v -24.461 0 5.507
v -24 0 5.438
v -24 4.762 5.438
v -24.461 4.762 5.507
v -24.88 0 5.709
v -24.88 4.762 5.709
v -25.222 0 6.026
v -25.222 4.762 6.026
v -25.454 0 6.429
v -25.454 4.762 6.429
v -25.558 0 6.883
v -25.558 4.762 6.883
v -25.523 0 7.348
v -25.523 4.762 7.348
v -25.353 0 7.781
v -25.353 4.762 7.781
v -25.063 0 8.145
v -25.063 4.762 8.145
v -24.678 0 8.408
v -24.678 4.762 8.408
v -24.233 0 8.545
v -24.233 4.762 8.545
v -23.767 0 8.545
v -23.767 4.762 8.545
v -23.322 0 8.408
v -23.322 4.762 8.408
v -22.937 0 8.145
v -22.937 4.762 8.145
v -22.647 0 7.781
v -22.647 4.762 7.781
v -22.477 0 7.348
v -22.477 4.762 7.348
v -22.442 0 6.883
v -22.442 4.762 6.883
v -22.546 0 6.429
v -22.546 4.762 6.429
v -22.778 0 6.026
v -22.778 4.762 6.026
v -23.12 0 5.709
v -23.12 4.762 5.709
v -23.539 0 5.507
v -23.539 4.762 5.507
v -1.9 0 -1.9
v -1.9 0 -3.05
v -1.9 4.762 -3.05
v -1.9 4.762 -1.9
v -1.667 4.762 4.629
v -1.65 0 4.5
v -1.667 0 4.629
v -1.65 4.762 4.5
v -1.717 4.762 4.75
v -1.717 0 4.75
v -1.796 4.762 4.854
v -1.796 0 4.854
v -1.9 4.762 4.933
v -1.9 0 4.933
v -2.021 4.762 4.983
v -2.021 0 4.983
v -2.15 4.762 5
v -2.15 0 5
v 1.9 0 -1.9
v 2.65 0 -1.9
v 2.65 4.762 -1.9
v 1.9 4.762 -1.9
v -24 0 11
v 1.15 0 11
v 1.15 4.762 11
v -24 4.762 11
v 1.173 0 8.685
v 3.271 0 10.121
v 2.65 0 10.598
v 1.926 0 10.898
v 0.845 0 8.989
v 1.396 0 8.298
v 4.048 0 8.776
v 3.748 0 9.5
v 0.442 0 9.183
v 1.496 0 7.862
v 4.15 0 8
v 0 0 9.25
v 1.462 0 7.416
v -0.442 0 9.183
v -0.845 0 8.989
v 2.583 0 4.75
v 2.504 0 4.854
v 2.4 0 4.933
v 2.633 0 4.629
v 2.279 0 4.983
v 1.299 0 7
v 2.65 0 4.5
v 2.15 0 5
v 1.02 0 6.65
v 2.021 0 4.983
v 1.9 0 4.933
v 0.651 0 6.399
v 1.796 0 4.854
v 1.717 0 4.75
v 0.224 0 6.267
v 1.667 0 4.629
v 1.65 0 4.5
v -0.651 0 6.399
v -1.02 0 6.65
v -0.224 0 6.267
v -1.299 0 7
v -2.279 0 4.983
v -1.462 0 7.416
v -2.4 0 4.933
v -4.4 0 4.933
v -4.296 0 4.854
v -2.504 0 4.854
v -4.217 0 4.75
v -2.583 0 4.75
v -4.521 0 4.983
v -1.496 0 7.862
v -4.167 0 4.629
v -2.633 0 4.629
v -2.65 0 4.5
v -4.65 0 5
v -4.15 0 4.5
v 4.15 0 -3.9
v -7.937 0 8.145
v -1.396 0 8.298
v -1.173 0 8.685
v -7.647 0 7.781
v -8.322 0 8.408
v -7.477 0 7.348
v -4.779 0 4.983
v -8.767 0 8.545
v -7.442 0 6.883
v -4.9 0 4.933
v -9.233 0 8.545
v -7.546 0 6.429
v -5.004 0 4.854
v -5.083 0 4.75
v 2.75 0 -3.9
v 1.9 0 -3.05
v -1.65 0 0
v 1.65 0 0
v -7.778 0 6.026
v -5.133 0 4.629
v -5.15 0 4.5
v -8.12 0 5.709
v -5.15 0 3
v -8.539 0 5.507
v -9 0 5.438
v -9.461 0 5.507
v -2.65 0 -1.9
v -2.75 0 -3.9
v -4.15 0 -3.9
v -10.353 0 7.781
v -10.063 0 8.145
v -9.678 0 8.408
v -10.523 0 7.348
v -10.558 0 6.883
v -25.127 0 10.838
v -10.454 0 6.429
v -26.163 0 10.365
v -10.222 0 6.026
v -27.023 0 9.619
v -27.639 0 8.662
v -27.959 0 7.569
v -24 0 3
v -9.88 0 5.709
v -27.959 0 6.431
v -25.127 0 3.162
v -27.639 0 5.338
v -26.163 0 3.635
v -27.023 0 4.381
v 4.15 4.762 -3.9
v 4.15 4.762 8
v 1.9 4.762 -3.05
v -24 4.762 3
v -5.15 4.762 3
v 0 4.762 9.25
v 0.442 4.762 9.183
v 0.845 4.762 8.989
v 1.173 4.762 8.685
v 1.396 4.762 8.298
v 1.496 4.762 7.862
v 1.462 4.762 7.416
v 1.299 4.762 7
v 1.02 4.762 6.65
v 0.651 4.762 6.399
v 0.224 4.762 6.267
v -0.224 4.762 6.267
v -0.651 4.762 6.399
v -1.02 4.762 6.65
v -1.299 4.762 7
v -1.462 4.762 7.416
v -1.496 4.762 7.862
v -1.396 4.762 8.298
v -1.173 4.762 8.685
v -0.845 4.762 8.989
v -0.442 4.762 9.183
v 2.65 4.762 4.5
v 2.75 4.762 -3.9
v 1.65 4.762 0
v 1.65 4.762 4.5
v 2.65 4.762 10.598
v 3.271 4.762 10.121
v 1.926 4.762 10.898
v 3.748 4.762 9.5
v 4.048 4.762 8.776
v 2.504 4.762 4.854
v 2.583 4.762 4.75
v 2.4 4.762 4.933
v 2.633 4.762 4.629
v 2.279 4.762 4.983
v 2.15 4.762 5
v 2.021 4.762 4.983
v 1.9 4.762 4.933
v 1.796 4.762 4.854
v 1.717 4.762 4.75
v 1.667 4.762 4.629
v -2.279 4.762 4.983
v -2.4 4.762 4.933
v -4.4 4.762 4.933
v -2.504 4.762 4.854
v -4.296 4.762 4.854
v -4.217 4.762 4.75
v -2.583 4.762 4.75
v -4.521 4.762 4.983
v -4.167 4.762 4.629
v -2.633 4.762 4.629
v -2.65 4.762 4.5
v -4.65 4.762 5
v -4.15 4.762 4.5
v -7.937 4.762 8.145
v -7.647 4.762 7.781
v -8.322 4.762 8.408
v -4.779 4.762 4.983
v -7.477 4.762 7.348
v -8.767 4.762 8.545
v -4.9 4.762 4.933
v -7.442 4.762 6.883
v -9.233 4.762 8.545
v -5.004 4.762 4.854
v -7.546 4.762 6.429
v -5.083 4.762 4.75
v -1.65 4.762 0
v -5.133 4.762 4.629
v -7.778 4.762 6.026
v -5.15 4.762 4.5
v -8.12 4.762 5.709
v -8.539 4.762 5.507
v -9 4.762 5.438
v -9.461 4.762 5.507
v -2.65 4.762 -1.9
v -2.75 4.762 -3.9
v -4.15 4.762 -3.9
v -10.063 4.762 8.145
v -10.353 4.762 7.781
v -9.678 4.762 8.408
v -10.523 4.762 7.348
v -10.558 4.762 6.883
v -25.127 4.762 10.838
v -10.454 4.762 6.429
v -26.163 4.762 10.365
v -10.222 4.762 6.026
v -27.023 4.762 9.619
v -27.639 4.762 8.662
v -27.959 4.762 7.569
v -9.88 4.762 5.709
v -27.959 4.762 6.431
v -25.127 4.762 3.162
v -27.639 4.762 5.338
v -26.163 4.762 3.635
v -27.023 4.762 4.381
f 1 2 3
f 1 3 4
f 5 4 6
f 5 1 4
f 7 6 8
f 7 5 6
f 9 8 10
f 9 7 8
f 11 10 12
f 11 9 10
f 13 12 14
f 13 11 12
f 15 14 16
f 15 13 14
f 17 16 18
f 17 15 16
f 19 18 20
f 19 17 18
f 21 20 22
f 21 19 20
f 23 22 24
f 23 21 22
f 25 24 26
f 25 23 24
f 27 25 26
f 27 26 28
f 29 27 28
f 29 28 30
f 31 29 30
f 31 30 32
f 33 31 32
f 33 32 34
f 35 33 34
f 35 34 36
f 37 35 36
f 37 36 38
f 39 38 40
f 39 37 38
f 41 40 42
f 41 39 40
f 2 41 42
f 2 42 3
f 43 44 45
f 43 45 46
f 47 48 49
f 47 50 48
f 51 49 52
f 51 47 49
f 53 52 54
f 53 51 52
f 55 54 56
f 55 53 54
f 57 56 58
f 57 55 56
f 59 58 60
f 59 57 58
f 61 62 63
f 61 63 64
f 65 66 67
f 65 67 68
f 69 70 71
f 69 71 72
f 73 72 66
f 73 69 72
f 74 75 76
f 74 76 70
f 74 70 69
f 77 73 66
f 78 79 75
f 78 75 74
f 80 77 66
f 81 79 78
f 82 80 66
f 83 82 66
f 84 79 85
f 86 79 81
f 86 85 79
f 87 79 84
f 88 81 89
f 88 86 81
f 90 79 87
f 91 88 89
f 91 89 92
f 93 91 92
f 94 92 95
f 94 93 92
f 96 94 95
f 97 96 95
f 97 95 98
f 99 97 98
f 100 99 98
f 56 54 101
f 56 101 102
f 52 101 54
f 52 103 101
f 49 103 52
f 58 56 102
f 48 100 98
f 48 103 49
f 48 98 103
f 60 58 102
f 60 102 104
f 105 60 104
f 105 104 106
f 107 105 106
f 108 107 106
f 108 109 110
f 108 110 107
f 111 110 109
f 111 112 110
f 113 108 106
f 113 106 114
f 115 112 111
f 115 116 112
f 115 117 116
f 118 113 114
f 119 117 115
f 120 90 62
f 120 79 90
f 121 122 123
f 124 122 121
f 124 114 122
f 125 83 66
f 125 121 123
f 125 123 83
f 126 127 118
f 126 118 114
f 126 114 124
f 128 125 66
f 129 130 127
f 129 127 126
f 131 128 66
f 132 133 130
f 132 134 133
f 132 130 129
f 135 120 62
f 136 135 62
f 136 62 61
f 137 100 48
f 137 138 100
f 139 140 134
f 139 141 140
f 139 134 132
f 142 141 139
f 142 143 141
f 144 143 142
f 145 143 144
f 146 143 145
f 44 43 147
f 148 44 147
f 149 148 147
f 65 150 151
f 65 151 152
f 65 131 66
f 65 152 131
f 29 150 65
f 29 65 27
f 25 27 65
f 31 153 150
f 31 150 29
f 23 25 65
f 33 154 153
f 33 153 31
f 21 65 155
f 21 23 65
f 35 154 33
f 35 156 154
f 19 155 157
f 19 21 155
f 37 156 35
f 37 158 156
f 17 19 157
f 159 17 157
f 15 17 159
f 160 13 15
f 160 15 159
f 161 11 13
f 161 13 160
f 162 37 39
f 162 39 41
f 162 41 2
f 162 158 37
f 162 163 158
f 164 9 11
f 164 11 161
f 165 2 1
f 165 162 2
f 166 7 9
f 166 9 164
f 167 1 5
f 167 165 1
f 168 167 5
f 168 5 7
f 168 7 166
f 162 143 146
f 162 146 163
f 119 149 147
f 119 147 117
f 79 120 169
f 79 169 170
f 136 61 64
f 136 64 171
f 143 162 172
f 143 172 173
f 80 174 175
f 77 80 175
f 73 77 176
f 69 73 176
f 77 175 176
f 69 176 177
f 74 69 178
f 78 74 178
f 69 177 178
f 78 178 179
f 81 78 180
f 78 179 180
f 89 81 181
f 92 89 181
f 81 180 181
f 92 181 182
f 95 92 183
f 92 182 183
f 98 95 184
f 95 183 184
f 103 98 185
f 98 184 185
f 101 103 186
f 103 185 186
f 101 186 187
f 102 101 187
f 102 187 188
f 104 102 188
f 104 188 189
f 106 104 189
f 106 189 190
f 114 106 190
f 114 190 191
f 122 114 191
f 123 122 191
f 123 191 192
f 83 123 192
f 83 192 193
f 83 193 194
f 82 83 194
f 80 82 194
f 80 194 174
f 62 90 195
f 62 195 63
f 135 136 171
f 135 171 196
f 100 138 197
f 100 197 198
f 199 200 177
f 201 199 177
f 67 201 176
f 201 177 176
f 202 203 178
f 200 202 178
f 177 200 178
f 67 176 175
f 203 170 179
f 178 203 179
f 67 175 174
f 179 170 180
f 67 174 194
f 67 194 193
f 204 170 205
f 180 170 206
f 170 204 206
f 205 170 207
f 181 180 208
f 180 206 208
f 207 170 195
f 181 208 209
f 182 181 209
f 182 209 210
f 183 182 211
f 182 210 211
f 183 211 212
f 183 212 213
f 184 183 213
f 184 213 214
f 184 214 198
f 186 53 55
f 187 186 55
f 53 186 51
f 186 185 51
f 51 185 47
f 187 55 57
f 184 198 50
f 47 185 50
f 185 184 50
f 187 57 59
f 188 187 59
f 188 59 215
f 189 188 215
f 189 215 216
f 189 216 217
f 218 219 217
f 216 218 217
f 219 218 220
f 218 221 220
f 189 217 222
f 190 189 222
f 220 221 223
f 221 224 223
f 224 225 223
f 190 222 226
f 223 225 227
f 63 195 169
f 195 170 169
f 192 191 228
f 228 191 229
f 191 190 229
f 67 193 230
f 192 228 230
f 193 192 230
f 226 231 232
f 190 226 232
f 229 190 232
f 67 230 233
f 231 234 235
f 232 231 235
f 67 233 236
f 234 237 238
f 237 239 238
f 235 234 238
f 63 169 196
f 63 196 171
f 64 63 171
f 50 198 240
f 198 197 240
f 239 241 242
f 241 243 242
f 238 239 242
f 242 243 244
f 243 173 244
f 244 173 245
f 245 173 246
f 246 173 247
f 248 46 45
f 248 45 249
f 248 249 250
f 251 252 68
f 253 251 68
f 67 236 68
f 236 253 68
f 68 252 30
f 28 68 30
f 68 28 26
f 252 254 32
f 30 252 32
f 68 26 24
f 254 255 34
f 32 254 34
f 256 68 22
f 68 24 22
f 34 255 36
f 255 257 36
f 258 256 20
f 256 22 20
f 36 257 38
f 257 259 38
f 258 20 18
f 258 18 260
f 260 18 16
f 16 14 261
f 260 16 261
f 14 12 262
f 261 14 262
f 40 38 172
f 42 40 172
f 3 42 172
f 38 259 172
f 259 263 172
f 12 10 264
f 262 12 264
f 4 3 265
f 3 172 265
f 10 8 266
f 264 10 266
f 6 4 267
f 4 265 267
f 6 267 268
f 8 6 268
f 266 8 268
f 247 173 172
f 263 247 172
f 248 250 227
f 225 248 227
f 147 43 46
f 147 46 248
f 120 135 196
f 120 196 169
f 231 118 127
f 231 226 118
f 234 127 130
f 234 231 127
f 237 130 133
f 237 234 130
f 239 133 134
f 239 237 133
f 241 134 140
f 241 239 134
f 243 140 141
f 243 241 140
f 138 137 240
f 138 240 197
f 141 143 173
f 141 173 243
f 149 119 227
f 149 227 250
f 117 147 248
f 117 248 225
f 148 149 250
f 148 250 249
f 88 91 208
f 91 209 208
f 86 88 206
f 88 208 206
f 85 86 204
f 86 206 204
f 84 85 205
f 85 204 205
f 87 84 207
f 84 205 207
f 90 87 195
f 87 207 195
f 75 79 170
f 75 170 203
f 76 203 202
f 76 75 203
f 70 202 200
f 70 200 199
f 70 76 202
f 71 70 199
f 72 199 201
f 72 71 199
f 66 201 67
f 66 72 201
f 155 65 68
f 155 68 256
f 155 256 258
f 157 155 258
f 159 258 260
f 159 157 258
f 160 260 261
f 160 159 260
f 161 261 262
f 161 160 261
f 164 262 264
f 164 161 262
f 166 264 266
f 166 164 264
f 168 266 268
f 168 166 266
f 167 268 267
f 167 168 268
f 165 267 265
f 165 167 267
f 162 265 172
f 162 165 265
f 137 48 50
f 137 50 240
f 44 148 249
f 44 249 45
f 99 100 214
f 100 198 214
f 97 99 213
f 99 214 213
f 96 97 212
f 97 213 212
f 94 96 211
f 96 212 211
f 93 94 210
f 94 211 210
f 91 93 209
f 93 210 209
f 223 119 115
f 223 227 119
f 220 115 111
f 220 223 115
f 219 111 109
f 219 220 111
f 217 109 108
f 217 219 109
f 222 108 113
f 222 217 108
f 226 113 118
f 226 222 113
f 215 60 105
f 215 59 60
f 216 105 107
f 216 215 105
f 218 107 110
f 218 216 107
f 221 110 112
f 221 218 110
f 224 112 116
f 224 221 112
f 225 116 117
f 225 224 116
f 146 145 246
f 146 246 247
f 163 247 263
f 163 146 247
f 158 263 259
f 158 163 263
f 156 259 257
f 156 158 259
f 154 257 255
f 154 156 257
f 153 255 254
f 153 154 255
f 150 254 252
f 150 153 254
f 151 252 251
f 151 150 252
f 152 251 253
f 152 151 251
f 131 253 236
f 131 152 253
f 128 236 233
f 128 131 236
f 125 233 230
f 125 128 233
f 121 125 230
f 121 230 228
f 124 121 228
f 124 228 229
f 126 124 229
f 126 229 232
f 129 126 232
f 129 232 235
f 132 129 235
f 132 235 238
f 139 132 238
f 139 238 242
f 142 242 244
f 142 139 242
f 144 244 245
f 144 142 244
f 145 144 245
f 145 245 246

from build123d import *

# Parameters (mm, degrees)
SKETCH1_R           = 1.5625
BOSS_EXTRUDE1_DEPTH = 4.7625
FILLET1_R           = 0.5
SKETCH2_R           = 1.5
CUT_EXTRUDE1_DEPTH  = 31.457862798


with BuildPart() as part:
    # Sketch1 → Boss-Extrude1 (new body)
    with BuildSketch(Plane(origin=(0, 0, 0), x_dir=(1, 0, 0), z_dir=(0, 1, 0))):
        with BuildLine():
            Line((-1.65, 0), (1.65, 0))
            Line((1.65, 0), (1.65, -5))
            Line((1.65, -5), (2.65, -5))
            Line((2.65, -5), (2.65, 1.9))
            Line((2.65, 1.9), (1.9, 1.9))
            Line((1.9, 1.9), (1.9, 3.05))
            Line((1.9, 3.05), (2.75, 3.9))
            Line((2.75, 3.9), (4.15, 3.9))
            Line((4.15, 3.9), (4.15, -8))
            ThreePointArc((4.15, -8), (3.271320344, -10.121320344), (1.15, -11))
            Line((1.15, -11), (-24, -11))
            ThreePointArc((-24, -11), (-28, -7), (-24, -3))
            Line((-24, -3), (-5.15, -3))
            Line((-5.15, -3), (-5.15, -5))
            Line((-5.15, -5), (-4.15, -5))
            Line((-4.15, -5), (-4.15, 3.9))
            Line((-4.15, 3.9), (-2.75, 3.9))
            Line((-2.75, 3.9), (-1.9, 3.05))
            Line((-1.9, 3.05), (-1.9, 1.9))
            Line((-1.9, 1.9), (-2.65, 1.9))
            Line((-2.65, 1.9), (-2.65, -5))
            Line((-2.65, -5), (-1.65, -5))
            Line((-1.65, -5), (-1.65, 0))
        make_face()
        with Locations(Location((-24, -7, 0), (0, 0, 90))):
            Circle(SKETCH1_R, mode=Mode.SUBTRACT)
        with Locations(Location((-9, -7, 0), (0, 0, 90))):
            Circle(SKETCH1_R, mode=Mode.SUBTRACT)
    extrude(amount=BOSS_EXTRUDE1_DEPTH)

    # Fillet1
    fillet1_edges = [part.edges().sort_by_distance(p)[0] for p in [
        (-2.65, 2.38125, 5),
        (-1.65, 2.38125, 5),
        (2.65, 2.38125, 5),
        (1.65, 2.38125, 5),
        (-5.15, 2.38125, 5),
        (-4.15, 2.38125, 5),
    ]]
    fillet(fillet1_edges, radius=FILLET1_R - 0.0001)  # a hair under: the kernel refuses the full size

    # Sketch2 → Cut-Extrude1 (cut, through all)
    with BuildSketch(Plane(origin=(0, 4.7625, 0), x_dir=(1, 0, 0), z_dir=(0, 1, 0))):
        with Locations(Location((0, -7.75, 0), (0, 0, 270))):
            Circle(SKETCH2_R)
    extrude(amount=-CUT_EXTRUDE1_DEPTH, mode=Mode.SUBTRACT)


solid = part.part
